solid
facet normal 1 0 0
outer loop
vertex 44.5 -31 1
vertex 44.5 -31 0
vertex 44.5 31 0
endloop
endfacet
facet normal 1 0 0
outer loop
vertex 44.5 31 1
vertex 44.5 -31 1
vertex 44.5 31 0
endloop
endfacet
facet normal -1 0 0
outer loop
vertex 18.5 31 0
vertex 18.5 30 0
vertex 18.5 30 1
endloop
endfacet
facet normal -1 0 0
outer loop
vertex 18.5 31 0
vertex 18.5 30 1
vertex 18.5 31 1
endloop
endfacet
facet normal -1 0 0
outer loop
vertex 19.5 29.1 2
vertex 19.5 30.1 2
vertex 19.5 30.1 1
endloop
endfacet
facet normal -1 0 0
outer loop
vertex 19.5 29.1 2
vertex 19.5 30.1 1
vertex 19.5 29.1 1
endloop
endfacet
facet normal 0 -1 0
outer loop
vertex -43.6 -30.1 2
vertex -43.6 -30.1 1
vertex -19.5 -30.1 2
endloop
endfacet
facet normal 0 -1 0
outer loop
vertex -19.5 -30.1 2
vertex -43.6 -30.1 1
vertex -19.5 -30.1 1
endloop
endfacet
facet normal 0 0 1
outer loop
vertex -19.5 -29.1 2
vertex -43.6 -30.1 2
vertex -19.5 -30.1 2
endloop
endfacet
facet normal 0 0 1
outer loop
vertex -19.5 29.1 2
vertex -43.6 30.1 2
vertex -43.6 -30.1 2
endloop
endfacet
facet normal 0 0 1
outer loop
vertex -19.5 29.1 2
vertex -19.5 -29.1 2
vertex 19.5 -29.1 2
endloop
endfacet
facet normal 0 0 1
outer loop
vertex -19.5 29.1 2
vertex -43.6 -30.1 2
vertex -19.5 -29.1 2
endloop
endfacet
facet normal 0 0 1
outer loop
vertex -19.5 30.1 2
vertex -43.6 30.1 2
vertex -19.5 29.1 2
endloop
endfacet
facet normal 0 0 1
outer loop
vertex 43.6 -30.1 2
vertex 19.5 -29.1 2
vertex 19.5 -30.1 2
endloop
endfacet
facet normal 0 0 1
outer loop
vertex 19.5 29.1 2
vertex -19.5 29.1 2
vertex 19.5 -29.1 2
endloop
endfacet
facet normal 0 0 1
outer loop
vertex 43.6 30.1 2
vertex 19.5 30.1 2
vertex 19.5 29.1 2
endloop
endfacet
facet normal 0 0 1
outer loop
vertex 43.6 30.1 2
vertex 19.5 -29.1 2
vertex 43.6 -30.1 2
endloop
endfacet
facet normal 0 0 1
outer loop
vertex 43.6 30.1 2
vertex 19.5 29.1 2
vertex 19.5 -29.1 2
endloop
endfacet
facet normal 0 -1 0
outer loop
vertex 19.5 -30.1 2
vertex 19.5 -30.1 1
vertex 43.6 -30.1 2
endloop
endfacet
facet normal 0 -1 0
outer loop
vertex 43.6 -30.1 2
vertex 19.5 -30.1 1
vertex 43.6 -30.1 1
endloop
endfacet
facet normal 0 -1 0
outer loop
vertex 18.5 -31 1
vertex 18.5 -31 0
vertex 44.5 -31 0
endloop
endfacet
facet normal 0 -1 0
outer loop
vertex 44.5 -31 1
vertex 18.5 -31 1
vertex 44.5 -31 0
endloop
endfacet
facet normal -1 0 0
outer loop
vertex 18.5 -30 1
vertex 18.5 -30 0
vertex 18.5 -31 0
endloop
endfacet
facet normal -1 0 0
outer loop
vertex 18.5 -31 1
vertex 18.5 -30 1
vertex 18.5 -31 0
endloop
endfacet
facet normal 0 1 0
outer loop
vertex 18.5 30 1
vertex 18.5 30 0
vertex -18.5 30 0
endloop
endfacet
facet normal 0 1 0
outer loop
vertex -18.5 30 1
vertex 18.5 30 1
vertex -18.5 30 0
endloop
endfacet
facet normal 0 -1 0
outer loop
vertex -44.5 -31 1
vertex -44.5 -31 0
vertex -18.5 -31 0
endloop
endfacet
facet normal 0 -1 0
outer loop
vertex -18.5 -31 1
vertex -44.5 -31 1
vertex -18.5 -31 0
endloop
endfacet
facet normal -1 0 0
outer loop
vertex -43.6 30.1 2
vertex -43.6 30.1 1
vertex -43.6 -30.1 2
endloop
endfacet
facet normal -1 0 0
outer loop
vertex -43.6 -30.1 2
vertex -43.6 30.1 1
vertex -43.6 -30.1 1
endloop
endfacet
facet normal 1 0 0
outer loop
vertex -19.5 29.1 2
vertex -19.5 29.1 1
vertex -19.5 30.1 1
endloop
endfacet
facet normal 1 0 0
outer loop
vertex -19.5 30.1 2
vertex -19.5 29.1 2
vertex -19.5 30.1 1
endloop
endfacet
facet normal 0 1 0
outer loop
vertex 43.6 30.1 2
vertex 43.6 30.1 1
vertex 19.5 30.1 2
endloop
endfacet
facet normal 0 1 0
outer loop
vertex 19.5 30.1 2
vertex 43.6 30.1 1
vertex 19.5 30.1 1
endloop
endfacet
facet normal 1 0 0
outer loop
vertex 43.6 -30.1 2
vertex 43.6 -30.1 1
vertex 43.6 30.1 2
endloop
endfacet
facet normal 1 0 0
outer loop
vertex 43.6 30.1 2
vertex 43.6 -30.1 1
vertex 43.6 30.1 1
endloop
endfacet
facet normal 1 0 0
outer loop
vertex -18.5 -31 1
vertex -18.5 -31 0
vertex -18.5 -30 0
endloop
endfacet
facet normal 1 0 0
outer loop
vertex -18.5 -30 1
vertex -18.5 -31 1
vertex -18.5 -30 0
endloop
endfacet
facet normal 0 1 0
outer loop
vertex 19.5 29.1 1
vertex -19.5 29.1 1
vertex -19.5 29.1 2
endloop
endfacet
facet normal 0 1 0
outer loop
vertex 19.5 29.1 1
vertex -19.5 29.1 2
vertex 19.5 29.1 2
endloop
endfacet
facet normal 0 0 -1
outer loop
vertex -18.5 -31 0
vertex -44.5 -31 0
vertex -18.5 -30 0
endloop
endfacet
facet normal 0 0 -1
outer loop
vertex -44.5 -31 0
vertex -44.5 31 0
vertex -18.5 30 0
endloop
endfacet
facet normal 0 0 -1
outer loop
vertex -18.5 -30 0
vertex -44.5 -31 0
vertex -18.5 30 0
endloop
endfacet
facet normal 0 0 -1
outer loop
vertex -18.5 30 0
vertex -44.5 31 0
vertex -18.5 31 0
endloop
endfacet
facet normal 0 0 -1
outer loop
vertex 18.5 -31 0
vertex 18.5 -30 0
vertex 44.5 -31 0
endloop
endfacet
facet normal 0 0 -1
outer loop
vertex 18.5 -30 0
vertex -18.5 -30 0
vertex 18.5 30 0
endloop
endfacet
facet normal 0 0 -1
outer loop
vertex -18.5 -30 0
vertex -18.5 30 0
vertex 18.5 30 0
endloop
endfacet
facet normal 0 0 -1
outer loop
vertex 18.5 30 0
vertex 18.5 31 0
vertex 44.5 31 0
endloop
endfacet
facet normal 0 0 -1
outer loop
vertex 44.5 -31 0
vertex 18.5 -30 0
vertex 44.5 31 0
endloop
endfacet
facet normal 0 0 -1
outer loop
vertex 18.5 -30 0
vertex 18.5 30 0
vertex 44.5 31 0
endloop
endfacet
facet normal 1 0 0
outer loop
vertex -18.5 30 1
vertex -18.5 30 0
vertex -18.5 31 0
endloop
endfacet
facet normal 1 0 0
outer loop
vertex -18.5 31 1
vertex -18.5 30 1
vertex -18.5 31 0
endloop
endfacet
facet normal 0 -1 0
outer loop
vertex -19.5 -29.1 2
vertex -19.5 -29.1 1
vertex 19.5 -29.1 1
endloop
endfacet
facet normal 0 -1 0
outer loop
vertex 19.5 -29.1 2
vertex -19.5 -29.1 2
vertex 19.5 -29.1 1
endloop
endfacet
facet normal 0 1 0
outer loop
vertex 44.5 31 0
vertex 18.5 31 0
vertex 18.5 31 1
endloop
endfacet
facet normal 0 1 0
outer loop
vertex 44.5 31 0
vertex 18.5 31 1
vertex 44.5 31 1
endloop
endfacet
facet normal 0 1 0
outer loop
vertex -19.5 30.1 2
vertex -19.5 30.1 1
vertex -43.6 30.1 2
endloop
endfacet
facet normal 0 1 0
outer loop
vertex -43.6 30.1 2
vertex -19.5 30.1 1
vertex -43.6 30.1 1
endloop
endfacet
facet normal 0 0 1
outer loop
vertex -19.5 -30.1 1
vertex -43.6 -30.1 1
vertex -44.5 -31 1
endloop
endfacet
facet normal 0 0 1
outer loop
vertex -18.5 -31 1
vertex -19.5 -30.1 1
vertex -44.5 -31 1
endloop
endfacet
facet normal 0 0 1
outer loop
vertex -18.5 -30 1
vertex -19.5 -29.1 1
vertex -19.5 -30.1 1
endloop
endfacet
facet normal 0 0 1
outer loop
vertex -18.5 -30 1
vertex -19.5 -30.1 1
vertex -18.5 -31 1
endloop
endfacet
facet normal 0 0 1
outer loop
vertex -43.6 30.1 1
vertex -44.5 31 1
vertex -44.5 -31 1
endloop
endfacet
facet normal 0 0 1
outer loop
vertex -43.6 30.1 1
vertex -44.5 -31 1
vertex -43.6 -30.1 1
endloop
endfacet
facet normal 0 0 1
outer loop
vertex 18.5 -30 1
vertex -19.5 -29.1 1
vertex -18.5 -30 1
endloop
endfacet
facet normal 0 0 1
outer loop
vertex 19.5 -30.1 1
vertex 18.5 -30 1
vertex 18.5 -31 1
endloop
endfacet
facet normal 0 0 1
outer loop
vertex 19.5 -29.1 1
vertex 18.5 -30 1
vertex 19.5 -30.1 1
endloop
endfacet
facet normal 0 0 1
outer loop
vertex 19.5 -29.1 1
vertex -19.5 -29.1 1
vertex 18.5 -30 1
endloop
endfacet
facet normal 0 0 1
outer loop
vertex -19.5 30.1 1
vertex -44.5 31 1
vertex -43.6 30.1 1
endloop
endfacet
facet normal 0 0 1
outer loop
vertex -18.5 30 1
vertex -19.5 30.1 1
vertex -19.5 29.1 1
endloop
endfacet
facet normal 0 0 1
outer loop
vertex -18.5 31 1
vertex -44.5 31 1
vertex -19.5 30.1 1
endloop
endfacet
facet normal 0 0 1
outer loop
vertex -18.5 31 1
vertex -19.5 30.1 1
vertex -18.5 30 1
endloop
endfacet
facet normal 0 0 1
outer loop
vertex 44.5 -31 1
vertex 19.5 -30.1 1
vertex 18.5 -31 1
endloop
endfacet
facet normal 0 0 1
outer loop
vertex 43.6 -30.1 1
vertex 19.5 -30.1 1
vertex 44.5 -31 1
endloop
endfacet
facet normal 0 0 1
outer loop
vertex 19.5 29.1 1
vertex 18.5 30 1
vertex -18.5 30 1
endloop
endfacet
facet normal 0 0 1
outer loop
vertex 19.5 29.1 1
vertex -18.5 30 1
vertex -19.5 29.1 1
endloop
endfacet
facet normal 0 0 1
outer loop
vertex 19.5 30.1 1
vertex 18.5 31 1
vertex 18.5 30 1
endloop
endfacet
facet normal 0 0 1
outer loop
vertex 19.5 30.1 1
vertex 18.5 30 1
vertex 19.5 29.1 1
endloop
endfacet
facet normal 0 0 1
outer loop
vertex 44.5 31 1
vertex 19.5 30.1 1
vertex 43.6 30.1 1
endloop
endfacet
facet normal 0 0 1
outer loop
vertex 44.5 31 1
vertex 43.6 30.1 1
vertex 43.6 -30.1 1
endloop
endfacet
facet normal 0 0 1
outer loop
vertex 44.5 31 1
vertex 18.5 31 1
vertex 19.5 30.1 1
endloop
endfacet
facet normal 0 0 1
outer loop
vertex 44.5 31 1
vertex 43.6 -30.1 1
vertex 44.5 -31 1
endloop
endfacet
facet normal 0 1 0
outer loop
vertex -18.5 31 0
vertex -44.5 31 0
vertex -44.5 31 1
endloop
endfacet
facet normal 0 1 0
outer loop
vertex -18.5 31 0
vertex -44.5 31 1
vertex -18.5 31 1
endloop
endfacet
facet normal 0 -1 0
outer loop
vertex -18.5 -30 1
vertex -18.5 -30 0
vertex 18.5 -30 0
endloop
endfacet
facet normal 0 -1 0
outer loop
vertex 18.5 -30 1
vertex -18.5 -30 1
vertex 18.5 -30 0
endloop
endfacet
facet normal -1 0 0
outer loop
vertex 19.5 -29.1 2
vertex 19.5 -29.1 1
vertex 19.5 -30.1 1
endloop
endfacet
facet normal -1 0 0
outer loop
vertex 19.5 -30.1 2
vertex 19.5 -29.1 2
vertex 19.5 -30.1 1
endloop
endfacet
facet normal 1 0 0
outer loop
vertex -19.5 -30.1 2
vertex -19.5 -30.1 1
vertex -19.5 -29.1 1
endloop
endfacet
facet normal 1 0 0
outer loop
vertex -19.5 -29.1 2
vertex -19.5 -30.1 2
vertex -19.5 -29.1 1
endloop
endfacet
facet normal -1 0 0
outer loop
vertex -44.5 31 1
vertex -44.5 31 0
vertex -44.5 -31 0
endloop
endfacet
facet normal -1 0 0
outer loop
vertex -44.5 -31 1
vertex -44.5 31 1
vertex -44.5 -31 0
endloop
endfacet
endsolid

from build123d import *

# Parameters (mm, degrees)
F0_W     = 26
F0_H     = 1
F0_H_2   = 60
F0_W_2   = 37
F1_DEPTH = 1
F2_W     = 39
F2_H     = 58.2
F3_DEPTH = 1


with BuildPart() as f1:
    # F0 (on Top) → F1 (new body)
    with BuildSketch(Plane.XY):
        with Locations((31.5, -30.5)):
            Rectangle(F0_W, F0_H)
        with Locations((31.5, 0)):
            Rectangle(F0_W, F0_H_2)
        Rectangle(F0_W_2, F0_H_2)
        with Locations((31.5, 30.5)):
            Rectangle(F0_W, F0_H)
        with Locations((-31.5, -30.5)):
            Rectangle(F0_W, F0_H)
        with Locations((-31.5, 0)):
            Rectangle(F0_W, F0_H_2)
        with Locations((-31.5, 30.5)):
            Rectangle(F0_W, F0_H)
    extrude(amount=F1_DEPTH)

    # F2 (on face) → F3 (join)
    with BuildSketch(Plane.XY.offset(1)):
        Polygon((-19.5, 30.1), (-43.6, 30.1), (-43.6, -30.1), (-19.5, -30.1), (-19.5, -29.1), (-19.5, 29.1), align=None)
        Rectangle(F2_W, F2_H)
        Polygon((19.5, 30.1), (19.5, 29.1), (19.5, -29.1), (19.5, -30.1), (43.6, -30.1), (43.6, 30.1), align=None)
    extrude(amount=F3_DEPTH)


solid = f1.part
